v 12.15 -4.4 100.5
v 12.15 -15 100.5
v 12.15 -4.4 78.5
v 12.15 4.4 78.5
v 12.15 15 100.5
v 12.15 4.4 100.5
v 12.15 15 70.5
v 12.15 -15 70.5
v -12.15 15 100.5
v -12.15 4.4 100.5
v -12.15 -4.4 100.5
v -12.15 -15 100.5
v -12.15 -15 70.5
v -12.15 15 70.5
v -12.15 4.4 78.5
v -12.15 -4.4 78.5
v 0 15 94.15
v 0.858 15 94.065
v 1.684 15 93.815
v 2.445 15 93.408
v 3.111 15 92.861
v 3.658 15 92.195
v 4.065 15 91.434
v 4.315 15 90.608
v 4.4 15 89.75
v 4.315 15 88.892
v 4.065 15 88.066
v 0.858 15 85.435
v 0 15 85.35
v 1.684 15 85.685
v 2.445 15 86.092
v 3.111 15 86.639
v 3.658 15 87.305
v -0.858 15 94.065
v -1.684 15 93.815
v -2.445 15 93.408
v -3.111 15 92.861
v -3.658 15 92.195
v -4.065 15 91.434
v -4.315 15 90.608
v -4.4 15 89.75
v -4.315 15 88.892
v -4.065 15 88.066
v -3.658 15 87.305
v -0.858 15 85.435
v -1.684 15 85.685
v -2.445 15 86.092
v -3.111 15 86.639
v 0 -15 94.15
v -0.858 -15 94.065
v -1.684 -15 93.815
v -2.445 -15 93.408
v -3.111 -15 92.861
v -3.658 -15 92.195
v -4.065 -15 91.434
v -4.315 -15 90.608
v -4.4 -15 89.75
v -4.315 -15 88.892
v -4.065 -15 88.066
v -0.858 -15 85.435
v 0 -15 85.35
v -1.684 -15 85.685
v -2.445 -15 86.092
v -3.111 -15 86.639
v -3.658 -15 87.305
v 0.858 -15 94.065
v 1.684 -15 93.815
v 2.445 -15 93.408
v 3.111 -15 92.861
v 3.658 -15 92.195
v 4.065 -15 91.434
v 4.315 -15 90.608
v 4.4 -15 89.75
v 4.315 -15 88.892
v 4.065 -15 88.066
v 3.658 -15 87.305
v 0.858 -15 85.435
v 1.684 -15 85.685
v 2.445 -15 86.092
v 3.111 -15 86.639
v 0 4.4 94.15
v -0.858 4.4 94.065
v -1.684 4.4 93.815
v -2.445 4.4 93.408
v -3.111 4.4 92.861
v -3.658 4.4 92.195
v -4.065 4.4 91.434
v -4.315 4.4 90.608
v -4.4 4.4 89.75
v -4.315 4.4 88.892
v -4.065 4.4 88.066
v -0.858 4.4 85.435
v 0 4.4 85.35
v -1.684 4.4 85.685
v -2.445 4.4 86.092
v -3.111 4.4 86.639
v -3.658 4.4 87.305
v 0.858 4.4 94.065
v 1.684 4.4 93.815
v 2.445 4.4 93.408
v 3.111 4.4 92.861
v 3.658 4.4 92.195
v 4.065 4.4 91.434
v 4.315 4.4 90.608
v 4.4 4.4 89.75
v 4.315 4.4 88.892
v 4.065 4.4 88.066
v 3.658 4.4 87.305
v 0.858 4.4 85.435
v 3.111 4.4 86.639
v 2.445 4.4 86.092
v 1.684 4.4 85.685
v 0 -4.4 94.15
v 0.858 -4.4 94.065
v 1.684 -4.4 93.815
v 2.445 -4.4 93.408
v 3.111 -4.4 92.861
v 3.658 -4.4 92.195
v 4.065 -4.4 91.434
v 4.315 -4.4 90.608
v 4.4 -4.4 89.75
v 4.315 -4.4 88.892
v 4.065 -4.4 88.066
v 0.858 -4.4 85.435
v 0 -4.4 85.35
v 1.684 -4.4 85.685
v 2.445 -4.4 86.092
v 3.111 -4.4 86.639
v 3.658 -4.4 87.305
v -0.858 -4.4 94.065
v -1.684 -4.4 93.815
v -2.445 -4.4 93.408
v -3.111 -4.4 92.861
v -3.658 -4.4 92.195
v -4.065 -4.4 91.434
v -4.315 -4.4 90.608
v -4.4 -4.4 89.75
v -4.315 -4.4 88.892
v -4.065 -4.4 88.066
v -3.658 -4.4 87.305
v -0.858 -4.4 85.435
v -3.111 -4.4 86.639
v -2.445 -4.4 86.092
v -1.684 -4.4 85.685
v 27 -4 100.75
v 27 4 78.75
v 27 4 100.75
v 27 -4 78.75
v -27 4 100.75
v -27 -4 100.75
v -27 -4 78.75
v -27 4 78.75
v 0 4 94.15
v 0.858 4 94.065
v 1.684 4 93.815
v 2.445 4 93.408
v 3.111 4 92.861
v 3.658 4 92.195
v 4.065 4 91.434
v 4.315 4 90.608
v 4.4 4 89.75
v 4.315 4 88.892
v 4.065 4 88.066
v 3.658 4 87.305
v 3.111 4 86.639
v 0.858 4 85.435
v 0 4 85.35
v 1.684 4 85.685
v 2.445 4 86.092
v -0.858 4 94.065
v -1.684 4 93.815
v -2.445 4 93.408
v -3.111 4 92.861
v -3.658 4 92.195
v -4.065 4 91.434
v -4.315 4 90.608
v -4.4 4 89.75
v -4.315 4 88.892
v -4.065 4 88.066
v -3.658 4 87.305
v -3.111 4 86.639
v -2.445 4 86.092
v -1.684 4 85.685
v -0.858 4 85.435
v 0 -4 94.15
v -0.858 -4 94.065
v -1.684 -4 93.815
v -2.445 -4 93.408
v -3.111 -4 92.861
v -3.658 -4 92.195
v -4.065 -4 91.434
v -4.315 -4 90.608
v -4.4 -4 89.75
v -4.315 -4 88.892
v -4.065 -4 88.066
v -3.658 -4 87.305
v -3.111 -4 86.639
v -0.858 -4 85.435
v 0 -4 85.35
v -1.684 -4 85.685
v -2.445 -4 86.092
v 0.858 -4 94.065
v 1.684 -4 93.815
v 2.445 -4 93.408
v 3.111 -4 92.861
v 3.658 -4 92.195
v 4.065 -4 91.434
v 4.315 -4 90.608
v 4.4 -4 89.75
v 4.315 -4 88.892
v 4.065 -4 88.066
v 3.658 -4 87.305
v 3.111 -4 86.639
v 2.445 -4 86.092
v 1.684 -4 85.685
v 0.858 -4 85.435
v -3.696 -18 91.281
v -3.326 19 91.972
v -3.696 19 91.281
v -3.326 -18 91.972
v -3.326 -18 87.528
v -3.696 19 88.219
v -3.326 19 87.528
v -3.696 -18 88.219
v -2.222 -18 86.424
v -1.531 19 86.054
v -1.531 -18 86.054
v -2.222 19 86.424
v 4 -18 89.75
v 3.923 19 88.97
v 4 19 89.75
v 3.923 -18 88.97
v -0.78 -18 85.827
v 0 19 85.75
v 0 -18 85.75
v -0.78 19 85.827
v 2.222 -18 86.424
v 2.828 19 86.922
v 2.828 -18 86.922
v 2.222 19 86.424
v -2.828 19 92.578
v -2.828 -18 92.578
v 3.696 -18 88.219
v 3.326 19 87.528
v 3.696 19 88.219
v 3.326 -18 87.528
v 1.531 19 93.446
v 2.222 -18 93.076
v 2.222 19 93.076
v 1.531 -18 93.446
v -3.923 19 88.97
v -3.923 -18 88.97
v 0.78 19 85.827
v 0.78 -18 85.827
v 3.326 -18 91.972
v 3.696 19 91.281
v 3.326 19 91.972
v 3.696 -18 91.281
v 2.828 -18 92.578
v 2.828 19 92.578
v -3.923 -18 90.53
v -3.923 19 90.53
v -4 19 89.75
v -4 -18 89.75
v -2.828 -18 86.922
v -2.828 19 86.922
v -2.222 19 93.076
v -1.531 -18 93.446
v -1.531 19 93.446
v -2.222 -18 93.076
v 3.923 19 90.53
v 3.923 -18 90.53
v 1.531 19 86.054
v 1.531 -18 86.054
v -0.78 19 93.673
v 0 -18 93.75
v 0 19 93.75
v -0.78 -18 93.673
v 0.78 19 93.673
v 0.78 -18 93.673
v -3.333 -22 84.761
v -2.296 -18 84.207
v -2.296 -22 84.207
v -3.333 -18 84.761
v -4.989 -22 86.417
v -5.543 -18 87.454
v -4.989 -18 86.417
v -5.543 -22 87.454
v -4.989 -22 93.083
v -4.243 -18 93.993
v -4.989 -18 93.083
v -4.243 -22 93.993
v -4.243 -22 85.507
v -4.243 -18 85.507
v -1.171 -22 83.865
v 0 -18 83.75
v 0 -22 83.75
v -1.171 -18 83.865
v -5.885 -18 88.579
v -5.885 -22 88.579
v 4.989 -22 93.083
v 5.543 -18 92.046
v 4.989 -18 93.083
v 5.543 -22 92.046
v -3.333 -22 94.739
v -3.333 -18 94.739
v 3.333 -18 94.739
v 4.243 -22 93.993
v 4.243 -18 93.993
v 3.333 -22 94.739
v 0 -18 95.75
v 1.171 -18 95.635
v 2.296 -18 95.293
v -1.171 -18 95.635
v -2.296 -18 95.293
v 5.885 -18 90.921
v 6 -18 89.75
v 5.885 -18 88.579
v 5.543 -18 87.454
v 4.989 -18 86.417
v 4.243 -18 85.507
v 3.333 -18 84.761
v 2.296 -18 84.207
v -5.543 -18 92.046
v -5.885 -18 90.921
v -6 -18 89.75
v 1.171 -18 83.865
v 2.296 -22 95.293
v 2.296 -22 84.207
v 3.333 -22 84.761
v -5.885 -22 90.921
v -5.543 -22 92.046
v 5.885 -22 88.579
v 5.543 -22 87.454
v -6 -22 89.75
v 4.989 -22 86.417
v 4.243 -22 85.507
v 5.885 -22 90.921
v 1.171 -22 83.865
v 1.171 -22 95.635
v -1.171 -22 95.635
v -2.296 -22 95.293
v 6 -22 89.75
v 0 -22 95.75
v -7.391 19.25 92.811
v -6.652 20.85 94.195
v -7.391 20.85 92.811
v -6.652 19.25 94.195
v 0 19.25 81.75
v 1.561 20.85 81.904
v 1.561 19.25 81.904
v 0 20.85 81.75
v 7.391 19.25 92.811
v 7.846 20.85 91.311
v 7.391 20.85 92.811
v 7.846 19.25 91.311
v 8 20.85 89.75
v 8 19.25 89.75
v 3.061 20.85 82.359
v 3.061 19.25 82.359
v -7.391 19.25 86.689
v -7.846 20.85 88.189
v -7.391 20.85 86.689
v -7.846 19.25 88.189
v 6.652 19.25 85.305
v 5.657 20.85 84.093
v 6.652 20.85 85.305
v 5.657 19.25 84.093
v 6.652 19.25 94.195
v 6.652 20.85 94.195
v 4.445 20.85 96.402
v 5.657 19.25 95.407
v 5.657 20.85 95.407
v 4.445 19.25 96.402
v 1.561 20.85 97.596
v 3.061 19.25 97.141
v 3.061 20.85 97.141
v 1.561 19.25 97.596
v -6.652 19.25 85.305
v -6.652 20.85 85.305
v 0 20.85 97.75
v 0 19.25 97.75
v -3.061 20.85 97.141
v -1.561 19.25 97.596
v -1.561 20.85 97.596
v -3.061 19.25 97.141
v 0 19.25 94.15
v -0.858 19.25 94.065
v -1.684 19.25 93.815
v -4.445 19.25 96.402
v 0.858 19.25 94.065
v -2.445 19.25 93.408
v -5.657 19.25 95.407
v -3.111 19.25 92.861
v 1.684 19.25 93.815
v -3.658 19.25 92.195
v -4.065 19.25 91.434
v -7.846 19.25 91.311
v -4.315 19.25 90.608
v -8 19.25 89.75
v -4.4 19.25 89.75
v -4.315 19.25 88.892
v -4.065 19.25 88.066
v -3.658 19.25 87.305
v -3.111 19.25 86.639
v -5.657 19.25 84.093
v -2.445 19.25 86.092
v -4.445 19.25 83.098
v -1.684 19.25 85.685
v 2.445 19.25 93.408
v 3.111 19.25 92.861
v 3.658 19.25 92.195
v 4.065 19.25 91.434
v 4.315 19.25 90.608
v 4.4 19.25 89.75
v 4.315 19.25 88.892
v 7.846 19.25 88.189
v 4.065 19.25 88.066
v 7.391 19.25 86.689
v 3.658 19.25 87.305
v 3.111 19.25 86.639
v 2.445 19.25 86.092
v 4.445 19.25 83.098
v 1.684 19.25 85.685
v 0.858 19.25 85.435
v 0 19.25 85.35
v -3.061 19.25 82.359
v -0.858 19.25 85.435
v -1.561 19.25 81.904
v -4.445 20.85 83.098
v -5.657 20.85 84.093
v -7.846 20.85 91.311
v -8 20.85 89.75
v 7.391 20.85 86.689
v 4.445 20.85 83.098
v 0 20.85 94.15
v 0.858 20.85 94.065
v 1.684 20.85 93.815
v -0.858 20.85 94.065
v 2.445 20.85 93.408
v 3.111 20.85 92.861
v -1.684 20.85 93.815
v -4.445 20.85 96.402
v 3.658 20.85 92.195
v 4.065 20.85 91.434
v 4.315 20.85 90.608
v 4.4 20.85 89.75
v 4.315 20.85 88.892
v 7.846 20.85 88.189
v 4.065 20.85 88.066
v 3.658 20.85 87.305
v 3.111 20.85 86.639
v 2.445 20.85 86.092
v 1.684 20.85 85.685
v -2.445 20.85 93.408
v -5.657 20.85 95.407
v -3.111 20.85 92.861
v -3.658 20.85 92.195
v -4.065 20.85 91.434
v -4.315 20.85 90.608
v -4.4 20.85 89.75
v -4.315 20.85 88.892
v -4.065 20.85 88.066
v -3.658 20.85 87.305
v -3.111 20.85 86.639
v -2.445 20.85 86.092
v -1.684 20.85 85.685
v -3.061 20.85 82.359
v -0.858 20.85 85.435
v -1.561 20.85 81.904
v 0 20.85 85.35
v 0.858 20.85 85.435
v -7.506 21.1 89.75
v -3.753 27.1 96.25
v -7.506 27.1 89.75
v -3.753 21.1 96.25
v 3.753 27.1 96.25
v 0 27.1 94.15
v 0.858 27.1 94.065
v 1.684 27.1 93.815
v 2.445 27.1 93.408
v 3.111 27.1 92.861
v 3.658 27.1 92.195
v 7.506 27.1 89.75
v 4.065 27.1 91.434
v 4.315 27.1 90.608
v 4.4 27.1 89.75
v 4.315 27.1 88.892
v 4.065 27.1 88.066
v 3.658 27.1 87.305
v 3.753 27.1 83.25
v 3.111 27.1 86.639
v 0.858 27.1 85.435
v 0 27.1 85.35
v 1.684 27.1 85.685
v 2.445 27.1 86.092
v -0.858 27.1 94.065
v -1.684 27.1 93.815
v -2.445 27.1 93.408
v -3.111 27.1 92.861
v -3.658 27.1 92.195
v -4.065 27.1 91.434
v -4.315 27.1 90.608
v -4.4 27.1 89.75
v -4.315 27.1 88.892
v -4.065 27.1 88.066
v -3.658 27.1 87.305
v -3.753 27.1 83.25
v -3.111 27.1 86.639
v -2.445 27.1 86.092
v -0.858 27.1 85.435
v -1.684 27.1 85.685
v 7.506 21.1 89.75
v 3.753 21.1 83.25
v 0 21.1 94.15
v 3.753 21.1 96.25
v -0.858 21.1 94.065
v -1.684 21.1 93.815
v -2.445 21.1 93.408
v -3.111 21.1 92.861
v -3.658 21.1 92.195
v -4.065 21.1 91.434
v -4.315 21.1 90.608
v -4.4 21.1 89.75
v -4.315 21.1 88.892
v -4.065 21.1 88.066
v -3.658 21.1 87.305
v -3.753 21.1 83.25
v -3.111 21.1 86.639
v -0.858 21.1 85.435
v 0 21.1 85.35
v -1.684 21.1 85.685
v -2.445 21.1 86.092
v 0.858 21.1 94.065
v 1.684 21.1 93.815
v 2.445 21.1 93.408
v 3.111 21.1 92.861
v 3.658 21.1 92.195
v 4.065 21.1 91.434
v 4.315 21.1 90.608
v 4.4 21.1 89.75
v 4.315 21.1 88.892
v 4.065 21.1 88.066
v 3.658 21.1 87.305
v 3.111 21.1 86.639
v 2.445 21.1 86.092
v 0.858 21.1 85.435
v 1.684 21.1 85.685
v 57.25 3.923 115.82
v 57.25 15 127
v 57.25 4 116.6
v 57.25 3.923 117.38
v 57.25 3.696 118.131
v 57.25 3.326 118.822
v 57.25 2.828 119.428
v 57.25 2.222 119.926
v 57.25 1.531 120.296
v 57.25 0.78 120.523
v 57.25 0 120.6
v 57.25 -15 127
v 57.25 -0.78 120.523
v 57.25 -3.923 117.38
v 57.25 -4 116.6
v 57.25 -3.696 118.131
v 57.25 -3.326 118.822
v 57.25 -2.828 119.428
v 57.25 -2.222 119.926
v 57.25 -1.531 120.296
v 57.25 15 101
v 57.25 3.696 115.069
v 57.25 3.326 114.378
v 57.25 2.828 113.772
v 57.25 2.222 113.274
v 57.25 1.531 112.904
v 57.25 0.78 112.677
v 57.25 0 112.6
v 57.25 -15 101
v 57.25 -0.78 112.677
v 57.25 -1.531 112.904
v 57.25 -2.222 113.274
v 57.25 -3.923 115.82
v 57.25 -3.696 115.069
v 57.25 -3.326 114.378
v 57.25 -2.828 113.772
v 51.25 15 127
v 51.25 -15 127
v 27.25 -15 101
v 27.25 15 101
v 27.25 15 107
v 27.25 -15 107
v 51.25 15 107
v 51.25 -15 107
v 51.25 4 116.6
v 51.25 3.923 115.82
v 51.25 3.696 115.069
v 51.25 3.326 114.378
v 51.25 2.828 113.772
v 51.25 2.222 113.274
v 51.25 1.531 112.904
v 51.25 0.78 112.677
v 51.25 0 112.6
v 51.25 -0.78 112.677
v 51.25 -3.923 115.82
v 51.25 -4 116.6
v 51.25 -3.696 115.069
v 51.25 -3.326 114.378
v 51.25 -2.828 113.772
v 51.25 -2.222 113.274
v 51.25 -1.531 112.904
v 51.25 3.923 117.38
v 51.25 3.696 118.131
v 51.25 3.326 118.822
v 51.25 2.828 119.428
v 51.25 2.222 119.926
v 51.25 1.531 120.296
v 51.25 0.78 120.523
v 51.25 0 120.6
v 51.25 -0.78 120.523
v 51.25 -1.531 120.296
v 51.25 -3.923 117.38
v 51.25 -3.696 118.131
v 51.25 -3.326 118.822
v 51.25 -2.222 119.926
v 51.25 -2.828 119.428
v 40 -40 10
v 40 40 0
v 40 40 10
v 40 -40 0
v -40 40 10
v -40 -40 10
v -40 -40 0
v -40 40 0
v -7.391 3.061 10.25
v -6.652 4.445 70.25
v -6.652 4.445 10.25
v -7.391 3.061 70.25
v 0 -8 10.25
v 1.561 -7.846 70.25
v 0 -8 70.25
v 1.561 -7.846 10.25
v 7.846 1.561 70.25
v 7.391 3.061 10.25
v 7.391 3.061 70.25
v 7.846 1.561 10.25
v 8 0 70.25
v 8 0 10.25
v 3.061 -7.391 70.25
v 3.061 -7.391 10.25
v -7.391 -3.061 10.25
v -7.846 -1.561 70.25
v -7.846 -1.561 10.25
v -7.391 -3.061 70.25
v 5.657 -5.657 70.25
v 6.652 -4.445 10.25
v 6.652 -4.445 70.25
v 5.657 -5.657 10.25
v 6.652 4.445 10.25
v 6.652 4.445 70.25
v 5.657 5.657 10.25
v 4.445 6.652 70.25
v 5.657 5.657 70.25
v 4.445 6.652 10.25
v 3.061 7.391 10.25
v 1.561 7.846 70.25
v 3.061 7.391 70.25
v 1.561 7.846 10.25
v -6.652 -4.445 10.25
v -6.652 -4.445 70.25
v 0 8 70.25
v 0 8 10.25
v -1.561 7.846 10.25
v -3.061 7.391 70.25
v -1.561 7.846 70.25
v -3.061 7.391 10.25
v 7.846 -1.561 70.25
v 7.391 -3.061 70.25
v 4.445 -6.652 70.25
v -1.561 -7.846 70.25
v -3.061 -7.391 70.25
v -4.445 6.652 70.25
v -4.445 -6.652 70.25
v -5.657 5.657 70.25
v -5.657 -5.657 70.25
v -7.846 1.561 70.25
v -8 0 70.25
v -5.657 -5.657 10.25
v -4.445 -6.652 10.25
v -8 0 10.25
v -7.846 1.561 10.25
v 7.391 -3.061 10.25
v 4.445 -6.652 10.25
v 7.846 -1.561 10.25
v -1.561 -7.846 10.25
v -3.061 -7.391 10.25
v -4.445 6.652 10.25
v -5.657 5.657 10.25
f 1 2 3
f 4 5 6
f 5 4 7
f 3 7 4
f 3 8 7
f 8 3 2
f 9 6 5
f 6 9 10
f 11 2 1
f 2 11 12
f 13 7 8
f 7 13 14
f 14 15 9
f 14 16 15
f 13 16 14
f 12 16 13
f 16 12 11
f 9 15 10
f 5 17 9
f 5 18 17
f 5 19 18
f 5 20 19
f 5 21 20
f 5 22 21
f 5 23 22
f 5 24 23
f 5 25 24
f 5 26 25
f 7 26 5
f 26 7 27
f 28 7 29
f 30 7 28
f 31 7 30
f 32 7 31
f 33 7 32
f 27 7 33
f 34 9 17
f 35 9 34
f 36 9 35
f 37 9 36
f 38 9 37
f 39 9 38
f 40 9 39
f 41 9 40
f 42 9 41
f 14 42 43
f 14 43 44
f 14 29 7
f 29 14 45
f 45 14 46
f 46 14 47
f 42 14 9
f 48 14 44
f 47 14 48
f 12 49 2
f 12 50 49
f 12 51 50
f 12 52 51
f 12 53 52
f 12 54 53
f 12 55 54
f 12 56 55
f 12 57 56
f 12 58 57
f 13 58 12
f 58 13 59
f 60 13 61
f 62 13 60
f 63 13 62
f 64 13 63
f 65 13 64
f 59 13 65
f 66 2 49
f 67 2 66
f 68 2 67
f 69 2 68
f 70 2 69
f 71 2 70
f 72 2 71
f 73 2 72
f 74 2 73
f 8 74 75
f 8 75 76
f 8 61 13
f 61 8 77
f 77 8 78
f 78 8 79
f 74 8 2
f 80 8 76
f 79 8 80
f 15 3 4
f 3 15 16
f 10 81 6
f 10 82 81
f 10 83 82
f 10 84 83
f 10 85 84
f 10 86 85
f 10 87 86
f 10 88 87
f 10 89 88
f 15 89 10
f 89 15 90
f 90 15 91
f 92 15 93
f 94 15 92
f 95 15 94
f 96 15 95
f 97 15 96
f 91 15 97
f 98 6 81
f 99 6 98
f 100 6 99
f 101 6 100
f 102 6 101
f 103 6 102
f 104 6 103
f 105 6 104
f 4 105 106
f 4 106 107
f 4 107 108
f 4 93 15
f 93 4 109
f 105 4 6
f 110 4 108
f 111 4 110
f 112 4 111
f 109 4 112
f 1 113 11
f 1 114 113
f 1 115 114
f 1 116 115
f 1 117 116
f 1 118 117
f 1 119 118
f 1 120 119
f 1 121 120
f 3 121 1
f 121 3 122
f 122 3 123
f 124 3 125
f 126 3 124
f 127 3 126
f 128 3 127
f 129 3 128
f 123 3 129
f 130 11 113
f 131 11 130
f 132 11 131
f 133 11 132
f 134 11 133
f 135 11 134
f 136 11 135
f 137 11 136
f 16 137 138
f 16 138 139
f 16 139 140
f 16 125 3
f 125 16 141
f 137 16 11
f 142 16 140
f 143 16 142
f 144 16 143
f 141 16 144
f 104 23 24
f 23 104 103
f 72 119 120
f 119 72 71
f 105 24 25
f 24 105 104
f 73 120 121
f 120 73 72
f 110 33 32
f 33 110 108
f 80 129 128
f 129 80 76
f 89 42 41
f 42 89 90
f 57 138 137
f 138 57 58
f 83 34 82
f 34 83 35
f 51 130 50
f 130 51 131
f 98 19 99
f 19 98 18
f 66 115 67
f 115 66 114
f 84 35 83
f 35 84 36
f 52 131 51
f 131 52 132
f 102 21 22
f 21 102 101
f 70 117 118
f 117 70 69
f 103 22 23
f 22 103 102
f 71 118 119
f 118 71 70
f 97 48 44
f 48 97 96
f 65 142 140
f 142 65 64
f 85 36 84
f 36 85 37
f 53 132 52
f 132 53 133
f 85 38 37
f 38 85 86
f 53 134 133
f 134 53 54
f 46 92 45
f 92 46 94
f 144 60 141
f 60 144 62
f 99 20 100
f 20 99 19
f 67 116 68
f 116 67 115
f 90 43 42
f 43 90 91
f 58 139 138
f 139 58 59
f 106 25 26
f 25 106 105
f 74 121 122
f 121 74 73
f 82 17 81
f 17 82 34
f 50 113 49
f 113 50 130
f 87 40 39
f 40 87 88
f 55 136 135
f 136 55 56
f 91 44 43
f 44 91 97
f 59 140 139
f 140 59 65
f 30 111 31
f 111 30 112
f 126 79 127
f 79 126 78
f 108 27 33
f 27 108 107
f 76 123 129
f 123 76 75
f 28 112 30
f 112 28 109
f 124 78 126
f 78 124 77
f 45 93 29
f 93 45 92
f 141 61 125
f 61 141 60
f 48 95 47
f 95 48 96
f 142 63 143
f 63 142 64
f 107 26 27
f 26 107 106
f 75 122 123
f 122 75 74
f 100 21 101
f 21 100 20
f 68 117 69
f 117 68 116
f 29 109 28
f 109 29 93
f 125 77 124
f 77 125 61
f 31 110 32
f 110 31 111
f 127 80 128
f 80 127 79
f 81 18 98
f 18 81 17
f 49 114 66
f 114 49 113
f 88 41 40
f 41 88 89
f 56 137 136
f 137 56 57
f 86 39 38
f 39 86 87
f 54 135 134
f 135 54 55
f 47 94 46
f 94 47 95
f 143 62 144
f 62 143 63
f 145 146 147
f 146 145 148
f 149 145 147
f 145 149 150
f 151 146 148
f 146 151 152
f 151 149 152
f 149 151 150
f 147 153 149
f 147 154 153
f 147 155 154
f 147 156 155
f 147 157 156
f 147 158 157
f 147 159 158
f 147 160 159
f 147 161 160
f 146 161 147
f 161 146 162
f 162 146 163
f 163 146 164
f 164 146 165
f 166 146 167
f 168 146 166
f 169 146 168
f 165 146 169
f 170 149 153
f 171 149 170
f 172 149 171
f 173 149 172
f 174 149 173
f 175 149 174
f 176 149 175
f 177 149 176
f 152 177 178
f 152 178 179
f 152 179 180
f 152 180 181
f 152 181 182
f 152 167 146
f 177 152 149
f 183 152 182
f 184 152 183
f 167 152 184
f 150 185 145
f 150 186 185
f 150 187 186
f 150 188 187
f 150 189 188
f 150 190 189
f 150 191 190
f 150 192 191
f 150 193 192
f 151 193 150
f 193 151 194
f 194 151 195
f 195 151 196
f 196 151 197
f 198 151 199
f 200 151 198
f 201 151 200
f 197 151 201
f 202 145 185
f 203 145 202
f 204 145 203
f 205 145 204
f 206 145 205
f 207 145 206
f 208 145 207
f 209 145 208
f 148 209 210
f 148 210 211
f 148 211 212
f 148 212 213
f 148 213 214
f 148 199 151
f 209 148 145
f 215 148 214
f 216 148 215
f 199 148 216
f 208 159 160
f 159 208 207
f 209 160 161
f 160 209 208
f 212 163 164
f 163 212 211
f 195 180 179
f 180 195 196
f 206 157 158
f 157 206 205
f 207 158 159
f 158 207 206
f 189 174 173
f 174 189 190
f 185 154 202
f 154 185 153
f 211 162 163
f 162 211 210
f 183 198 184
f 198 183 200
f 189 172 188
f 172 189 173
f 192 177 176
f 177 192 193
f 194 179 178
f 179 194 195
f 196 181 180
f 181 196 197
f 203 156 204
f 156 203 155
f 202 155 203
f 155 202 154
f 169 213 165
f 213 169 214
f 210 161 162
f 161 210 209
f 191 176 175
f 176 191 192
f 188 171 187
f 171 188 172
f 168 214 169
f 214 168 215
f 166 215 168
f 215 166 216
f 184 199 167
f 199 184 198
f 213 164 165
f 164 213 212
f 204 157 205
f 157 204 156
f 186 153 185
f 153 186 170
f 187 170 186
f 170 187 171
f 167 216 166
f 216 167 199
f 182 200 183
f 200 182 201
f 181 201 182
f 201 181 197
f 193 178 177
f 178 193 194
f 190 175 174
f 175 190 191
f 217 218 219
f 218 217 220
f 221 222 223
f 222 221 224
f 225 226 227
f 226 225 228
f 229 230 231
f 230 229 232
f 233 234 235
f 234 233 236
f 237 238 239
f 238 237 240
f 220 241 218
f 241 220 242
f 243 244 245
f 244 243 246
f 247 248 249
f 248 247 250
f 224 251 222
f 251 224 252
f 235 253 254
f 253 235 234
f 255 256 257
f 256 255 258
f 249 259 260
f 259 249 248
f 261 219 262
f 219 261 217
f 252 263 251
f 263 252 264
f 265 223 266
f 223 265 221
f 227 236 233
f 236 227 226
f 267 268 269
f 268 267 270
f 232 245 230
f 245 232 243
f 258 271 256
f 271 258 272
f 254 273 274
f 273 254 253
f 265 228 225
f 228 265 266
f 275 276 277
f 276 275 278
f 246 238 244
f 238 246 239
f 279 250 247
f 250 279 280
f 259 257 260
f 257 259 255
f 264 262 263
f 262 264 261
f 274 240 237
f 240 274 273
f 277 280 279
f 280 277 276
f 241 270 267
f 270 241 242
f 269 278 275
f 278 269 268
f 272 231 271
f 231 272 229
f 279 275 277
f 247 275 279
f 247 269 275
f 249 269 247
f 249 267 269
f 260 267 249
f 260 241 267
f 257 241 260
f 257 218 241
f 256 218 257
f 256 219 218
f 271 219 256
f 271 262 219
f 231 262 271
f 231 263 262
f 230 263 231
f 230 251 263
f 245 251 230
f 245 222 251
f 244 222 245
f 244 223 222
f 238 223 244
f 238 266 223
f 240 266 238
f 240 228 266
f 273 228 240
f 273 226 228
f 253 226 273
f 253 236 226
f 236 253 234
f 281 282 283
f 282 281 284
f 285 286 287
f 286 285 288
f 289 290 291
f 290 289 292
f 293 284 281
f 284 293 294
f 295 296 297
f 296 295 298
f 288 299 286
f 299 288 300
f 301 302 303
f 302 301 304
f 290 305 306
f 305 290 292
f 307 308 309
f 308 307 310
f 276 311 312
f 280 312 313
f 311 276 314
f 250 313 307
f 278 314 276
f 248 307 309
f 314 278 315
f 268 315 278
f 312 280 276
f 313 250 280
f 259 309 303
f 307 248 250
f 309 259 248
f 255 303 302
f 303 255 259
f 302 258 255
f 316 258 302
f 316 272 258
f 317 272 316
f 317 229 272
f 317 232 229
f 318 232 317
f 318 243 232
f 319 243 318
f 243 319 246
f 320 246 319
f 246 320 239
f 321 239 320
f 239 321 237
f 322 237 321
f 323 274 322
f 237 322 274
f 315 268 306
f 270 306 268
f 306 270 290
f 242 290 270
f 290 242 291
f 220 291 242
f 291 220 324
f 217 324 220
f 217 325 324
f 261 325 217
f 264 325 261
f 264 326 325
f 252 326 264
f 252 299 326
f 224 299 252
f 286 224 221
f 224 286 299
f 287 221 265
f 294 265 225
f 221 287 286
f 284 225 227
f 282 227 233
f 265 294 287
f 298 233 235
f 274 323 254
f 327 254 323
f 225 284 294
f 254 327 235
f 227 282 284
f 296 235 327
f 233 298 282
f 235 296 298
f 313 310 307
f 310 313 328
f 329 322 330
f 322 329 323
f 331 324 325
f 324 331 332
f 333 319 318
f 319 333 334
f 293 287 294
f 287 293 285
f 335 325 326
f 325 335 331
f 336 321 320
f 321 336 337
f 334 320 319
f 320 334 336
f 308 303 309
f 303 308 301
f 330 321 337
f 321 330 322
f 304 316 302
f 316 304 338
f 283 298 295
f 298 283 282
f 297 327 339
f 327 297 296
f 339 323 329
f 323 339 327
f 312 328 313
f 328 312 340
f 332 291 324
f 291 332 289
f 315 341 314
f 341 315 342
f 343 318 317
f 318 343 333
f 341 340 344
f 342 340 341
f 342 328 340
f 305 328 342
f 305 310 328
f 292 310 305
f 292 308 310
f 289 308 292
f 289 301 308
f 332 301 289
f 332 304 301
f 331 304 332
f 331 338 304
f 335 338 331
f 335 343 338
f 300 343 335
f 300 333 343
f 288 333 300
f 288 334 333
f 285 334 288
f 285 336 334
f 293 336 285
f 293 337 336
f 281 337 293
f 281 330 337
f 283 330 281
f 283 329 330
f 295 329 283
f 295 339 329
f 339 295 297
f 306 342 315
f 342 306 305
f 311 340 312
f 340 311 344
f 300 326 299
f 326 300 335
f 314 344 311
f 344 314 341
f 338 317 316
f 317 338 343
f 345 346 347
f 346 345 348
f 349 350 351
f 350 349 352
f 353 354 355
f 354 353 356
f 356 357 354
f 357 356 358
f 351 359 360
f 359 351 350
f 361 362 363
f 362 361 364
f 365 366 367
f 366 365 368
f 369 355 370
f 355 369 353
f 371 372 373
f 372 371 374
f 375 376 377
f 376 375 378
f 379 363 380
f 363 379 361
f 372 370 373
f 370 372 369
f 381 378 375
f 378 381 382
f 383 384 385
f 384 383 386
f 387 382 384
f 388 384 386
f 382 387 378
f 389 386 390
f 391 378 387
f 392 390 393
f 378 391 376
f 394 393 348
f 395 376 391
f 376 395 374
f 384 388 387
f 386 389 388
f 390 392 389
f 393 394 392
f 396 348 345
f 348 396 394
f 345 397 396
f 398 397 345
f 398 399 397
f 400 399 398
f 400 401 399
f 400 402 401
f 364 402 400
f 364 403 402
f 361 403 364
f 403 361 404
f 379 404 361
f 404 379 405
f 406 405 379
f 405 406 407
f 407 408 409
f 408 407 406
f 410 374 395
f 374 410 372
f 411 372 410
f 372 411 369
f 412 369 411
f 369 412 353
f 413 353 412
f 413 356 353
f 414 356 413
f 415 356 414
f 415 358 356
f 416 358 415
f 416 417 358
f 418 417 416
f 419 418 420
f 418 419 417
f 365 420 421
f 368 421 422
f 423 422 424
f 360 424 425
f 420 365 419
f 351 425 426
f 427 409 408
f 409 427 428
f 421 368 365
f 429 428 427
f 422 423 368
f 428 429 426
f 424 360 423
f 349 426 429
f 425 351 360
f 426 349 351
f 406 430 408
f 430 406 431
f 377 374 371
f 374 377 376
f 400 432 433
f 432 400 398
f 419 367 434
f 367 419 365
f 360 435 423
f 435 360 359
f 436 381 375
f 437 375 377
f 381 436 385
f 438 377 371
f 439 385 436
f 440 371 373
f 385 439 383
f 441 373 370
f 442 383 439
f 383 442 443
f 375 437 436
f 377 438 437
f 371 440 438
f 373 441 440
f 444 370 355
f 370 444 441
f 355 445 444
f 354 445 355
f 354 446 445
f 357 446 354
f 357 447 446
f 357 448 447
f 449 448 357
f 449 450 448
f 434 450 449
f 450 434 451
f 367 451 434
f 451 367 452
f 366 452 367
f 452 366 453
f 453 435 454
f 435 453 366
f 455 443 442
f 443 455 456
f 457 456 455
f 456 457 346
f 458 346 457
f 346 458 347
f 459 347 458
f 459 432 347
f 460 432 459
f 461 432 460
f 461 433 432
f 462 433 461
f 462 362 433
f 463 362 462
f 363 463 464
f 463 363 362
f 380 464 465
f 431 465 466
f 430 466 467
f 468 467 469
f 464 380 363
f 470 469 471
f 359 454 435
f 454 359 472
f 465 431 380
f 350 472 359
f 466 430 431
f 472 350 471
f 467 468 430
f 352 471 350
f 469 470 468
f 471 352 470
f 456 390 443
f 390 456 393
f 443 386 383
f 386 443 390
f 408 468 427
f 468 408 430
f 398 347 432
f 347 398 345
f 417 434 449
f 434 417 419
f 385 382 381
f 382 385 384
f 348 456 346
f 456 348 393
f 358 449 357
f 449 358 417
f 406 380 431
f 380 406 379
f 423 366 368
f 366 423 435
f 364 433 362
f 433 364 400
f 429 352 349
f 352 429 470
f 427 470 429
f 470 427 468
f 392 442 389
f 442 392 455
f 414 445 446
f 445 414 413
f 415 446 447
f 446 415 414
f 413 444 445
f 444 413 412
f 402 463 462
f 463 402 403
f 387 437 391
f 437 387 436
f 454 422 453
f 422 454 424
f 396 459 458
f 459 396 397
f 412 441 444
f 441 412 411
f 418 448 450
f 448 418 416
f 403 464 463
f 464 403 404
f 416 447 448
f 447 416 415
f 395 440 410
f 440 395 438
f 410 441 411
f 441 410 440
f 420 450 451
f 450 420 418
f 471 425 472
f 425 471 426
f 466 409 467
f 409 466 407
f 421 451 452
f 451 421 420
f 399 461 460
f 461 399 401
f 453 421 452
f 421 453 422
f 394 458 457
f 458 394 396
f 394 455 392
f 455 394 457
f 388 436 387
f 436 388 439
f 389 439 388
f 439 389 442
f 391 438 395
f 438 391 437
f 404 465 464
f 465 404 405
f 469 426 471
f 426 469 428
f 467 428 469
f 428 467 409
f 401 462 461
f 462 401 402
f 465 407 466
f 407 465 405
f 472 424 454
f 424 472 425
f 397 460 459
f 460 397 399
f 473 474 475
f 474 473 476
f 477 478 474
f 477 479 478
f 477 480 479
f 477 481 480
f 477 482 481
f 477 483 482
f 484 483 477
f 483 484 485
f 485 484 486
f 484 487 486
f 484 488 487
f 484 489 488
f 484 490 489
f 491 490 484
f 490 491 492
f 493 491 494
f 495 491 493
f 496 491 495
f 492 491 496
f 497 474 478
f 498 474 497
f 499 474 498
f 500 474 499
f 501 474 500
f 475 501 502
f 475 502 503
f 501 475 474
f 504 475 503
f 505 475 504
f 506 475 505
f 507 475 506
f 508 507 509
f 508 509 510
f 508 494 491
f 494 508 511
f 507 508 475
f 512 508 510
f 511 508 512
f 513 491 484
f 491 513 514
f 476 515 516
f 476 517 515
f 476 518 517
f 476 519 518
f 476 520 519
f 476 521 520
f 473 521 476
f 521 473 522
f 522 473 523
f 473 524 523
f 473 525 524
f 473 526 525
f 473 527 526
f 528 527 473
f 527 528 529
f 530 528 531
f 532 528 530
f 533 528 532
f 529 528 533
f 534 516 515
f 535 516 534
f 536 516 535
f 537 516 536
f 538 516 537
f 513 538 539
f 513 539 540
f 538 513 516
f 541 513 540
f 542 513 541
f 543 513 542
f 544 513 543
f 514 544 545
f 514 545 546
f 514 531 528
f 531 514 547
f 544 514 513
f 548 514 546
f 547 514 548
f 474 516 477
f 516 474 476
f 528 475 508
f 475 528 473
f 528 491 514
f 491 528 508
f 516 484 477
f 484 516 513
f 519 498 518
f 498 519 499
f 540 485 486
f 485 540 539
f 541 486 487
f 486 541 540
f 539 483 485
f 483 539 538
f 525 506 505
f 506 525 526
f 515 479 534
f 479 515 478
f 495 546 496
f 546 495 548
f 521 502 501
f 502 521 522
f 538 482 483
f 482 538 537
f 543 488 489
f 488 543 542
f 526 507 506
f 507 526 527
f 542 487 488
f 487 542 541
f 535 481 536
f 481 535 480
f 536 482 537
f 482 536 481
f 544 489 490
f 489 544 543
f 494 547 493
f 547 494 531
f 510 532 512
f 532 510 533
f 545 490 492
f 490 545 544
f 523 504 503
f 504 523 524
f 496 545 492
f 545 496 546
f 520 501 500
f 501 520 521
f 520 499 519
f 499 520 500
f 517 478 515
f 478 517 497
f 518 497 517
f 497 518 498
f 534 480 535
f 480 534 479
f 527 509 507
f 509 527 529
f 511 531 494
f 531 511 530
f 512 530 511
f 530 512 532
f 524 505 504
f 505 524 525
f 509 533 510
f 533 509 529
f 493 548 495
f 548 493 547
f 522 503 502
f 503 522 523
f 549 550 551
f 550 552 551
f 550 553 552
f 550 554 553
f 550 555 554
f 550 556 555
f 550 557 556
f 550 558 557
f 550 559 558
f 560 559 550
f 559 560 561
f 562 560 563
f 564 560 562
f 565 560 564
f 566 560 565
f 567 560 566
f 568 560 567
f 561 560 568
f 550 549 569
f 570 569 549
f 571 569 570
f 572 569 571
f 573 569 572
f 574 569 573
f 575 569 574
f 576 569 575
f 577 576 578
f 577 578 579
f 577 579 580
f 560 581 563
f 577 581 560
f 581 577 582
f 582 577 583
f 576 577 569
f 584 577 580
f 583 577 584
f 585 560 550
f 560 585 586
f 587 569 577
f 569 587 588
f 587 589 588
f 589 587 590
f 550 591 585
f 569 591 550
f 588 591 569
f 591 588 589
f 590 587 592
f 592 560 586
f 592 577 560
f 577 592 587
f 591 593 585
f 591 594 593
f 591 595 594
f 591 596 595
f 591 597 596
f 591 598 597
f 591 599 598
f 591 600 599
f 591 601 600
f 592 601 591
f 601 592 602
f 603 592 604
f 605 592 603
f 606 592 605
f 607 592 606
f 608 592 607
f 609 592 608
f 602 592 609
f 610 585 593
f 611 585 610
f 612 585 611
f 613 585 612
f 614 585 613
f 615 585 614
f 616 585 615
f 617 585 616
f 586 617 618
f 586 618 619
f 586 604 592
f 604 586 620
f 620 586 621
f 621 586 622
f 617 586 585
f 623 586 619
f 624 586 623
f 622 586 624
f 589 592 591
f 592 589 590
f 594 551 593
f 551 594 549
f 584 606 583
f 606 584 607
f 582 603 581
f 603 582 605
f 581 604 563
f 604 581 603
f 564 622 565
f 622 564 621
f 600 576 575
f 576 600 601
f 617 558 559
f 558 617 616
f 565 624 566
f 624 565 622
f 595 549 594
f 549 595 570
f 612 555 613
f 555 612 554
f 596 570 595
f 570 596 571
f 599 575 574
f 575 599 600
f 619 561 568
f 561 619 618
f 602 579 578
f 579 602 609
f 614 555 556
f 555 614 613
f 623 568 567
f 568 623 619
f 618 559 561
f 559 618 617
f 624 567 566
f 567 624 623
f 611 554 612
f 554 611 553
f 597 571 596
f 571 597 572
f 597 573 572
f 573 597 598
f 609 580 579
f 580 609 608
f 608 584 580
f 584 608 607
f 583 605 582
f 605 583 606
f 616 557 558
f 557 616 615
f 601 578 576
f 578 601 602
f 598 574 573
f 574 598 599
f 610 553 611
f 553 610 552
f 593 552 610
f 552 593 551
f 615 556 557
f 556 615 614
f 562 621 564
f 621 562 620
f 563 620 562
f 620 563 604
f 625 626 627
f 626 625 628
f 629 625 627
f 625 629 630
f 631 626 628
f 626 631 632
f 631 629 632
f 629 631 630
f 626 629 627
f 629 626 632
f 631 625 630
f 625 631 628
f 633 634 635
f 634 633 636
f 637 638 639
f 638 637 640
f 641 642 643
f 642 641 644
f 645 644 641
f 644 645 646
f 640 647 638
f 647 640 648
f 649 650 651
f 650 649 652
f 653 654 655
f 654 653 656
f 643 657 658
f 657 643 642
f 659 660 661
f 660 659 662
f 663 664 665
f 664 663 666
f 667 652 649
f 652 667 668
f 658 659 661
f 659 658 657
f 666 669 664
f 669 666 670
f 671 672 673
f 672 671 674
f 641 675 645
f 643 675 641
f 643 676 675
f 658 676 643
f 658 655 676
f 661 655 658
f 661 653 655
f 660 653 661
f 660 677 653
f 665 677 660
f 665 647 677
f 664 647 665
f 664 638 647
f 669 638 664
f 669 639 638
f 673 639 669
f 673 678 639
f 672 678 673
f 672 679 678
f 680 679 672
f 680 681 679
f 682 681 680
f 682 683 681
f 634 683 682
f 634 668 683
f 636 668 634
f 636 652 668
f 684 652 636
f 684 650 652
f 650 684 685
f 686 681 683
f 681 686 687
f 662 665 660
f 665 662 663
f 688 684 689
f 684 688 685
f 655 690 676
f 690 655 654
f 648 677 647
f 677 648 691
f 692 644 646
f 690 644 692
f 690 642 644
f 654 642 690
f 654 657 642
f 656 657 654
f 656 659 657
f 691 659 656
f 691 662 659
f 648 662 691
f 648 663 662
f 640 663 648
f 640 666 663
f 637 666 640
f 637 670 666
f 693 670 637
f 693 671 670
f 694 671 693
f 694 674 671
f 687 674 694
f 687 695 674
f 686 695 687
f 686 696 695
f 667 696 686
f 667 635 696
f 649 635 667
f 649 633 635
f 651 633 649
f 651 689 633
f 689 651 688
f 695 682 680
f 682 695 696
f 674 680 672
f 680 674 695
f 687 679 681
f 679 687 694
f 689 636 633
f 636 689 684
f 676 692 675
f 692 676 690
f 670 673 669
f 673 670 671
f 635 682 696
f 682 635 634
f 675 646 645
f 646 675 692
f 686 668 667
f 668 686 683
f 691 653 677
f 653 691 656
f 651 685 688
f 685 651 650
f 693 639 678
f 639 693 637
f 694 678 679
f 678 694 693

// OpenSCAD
$fn = 32;

// ------------------------------------------------------------------------
// Lamp arm: column d16 x 60 mm, arm 54 mm
// Every part is its own module, assembly() places every instance.
// ------------------------------------------------------------------------

// --- part 1 ---
module lamp_base() {
  difference() {
    translate([-40, -40, 0]) cube([80, 80, 10]);
  }
}

// --- part 2 ---
module lamp_column() {
  cylinder(h = 60, d = 16);
}

// --- part 3 ---
module head_fork() {
  difference() {
    translate([-12.15, -15, 0]) cube([24.3, 30, 30]);
    translate([-13.15, -4.4, 8]) cube([26.3, 8.8, 23]);
    translate([0, 0, 19.25]) rotate([90, 0, 0]) cylinder(h = 32, d = 8.8, center = true);
  }
}

// --- part 4 ---
module lamp_arm() {
  difference() {
    translate([-27, -4, 0]) cube([54, 8, 22]);
    translate([0, 0, 11]) rotate([90, 0, 0]) cylinder(h = 10, d = 8.8, center = true);
  }
}

// --- part 5 ---
module arm_pin() {
  rotate([0, 90, 0]) cylinder(h = 38, d = 8, center = true);
  translate([-22, 0, 0]) rotate([0, 90, 0]) cylinder(h = 4, d = 12);
}

// --- part 6 ---
module arm_washer() {
  difference() {
      translate([0, 0, 0]) cylinder(h = 1.6, d = 16);
      translate([0, 0, -1]) cylinder(h = 3.6, d = 8.8);
    }
}

// --- part 7 ---
module arm_nut() {
  difference() {
    linear_extrude(height = 6) polygon(points = [[7.506, 0], [3.753, 6.5], [-3.753, 6.5], [-7.506, 0], [-3.753, -6.5], [3.753, -6.5]]);
    translate([0, 0, -1]) cylinder(h = 8, d = 8.8);
  }
}

// --- part 8 ---
module shade_bracket() {
  difference() {
    translate([-15, -15, 0]) cube([30, 30, 26]);
    translate([-16, -16, 6]) cube([25, 32, 21]);
    translate([12, 0, 15.6]) rotate([0, 90, 0]) cylinder(h = 8, d = 8, center = true);
  }
}

// --- assembly ---
module assembly() {
  color([0.80, 0.24, 0.20]) translate([0, 0, 0]) rotate([0, 0, 0]) lamp_base();
  color([0.20, 0.45, 0.75]) translate([0, 0, 10.25]) rotate([0, 0, 0]) lamp_column();
  color([0.25, 0.62, 0.32]) translate([0, 0, 70.5]) rotate([0, 0, 0]) head_fork();
  color([0.92, 0.70, 0.18]) translate([0, 0, 78.75]) rotate([0, 0, 0]) lamp_arm();
  color([0.58, 0.35, 0.70]) translate([0, 0, 89.75]) rotate([0, 0, 90]) arm_pin();
  color([0.16, 0.66, 0.66]) translate([0, 20.85, 89.75]) rotate([90, 0, 0]) arm_washer();
  color([0.85, 0.48, 0.18]) translate([0, 27.1, 89.75]) rotate([90, 0, 0]) arm_nut();
  color([0.55, 0.60, 0.65]) translate([42.25, 0, 101]) rotate([0, 0, 0]) shade_bracket();
}

assembly();
